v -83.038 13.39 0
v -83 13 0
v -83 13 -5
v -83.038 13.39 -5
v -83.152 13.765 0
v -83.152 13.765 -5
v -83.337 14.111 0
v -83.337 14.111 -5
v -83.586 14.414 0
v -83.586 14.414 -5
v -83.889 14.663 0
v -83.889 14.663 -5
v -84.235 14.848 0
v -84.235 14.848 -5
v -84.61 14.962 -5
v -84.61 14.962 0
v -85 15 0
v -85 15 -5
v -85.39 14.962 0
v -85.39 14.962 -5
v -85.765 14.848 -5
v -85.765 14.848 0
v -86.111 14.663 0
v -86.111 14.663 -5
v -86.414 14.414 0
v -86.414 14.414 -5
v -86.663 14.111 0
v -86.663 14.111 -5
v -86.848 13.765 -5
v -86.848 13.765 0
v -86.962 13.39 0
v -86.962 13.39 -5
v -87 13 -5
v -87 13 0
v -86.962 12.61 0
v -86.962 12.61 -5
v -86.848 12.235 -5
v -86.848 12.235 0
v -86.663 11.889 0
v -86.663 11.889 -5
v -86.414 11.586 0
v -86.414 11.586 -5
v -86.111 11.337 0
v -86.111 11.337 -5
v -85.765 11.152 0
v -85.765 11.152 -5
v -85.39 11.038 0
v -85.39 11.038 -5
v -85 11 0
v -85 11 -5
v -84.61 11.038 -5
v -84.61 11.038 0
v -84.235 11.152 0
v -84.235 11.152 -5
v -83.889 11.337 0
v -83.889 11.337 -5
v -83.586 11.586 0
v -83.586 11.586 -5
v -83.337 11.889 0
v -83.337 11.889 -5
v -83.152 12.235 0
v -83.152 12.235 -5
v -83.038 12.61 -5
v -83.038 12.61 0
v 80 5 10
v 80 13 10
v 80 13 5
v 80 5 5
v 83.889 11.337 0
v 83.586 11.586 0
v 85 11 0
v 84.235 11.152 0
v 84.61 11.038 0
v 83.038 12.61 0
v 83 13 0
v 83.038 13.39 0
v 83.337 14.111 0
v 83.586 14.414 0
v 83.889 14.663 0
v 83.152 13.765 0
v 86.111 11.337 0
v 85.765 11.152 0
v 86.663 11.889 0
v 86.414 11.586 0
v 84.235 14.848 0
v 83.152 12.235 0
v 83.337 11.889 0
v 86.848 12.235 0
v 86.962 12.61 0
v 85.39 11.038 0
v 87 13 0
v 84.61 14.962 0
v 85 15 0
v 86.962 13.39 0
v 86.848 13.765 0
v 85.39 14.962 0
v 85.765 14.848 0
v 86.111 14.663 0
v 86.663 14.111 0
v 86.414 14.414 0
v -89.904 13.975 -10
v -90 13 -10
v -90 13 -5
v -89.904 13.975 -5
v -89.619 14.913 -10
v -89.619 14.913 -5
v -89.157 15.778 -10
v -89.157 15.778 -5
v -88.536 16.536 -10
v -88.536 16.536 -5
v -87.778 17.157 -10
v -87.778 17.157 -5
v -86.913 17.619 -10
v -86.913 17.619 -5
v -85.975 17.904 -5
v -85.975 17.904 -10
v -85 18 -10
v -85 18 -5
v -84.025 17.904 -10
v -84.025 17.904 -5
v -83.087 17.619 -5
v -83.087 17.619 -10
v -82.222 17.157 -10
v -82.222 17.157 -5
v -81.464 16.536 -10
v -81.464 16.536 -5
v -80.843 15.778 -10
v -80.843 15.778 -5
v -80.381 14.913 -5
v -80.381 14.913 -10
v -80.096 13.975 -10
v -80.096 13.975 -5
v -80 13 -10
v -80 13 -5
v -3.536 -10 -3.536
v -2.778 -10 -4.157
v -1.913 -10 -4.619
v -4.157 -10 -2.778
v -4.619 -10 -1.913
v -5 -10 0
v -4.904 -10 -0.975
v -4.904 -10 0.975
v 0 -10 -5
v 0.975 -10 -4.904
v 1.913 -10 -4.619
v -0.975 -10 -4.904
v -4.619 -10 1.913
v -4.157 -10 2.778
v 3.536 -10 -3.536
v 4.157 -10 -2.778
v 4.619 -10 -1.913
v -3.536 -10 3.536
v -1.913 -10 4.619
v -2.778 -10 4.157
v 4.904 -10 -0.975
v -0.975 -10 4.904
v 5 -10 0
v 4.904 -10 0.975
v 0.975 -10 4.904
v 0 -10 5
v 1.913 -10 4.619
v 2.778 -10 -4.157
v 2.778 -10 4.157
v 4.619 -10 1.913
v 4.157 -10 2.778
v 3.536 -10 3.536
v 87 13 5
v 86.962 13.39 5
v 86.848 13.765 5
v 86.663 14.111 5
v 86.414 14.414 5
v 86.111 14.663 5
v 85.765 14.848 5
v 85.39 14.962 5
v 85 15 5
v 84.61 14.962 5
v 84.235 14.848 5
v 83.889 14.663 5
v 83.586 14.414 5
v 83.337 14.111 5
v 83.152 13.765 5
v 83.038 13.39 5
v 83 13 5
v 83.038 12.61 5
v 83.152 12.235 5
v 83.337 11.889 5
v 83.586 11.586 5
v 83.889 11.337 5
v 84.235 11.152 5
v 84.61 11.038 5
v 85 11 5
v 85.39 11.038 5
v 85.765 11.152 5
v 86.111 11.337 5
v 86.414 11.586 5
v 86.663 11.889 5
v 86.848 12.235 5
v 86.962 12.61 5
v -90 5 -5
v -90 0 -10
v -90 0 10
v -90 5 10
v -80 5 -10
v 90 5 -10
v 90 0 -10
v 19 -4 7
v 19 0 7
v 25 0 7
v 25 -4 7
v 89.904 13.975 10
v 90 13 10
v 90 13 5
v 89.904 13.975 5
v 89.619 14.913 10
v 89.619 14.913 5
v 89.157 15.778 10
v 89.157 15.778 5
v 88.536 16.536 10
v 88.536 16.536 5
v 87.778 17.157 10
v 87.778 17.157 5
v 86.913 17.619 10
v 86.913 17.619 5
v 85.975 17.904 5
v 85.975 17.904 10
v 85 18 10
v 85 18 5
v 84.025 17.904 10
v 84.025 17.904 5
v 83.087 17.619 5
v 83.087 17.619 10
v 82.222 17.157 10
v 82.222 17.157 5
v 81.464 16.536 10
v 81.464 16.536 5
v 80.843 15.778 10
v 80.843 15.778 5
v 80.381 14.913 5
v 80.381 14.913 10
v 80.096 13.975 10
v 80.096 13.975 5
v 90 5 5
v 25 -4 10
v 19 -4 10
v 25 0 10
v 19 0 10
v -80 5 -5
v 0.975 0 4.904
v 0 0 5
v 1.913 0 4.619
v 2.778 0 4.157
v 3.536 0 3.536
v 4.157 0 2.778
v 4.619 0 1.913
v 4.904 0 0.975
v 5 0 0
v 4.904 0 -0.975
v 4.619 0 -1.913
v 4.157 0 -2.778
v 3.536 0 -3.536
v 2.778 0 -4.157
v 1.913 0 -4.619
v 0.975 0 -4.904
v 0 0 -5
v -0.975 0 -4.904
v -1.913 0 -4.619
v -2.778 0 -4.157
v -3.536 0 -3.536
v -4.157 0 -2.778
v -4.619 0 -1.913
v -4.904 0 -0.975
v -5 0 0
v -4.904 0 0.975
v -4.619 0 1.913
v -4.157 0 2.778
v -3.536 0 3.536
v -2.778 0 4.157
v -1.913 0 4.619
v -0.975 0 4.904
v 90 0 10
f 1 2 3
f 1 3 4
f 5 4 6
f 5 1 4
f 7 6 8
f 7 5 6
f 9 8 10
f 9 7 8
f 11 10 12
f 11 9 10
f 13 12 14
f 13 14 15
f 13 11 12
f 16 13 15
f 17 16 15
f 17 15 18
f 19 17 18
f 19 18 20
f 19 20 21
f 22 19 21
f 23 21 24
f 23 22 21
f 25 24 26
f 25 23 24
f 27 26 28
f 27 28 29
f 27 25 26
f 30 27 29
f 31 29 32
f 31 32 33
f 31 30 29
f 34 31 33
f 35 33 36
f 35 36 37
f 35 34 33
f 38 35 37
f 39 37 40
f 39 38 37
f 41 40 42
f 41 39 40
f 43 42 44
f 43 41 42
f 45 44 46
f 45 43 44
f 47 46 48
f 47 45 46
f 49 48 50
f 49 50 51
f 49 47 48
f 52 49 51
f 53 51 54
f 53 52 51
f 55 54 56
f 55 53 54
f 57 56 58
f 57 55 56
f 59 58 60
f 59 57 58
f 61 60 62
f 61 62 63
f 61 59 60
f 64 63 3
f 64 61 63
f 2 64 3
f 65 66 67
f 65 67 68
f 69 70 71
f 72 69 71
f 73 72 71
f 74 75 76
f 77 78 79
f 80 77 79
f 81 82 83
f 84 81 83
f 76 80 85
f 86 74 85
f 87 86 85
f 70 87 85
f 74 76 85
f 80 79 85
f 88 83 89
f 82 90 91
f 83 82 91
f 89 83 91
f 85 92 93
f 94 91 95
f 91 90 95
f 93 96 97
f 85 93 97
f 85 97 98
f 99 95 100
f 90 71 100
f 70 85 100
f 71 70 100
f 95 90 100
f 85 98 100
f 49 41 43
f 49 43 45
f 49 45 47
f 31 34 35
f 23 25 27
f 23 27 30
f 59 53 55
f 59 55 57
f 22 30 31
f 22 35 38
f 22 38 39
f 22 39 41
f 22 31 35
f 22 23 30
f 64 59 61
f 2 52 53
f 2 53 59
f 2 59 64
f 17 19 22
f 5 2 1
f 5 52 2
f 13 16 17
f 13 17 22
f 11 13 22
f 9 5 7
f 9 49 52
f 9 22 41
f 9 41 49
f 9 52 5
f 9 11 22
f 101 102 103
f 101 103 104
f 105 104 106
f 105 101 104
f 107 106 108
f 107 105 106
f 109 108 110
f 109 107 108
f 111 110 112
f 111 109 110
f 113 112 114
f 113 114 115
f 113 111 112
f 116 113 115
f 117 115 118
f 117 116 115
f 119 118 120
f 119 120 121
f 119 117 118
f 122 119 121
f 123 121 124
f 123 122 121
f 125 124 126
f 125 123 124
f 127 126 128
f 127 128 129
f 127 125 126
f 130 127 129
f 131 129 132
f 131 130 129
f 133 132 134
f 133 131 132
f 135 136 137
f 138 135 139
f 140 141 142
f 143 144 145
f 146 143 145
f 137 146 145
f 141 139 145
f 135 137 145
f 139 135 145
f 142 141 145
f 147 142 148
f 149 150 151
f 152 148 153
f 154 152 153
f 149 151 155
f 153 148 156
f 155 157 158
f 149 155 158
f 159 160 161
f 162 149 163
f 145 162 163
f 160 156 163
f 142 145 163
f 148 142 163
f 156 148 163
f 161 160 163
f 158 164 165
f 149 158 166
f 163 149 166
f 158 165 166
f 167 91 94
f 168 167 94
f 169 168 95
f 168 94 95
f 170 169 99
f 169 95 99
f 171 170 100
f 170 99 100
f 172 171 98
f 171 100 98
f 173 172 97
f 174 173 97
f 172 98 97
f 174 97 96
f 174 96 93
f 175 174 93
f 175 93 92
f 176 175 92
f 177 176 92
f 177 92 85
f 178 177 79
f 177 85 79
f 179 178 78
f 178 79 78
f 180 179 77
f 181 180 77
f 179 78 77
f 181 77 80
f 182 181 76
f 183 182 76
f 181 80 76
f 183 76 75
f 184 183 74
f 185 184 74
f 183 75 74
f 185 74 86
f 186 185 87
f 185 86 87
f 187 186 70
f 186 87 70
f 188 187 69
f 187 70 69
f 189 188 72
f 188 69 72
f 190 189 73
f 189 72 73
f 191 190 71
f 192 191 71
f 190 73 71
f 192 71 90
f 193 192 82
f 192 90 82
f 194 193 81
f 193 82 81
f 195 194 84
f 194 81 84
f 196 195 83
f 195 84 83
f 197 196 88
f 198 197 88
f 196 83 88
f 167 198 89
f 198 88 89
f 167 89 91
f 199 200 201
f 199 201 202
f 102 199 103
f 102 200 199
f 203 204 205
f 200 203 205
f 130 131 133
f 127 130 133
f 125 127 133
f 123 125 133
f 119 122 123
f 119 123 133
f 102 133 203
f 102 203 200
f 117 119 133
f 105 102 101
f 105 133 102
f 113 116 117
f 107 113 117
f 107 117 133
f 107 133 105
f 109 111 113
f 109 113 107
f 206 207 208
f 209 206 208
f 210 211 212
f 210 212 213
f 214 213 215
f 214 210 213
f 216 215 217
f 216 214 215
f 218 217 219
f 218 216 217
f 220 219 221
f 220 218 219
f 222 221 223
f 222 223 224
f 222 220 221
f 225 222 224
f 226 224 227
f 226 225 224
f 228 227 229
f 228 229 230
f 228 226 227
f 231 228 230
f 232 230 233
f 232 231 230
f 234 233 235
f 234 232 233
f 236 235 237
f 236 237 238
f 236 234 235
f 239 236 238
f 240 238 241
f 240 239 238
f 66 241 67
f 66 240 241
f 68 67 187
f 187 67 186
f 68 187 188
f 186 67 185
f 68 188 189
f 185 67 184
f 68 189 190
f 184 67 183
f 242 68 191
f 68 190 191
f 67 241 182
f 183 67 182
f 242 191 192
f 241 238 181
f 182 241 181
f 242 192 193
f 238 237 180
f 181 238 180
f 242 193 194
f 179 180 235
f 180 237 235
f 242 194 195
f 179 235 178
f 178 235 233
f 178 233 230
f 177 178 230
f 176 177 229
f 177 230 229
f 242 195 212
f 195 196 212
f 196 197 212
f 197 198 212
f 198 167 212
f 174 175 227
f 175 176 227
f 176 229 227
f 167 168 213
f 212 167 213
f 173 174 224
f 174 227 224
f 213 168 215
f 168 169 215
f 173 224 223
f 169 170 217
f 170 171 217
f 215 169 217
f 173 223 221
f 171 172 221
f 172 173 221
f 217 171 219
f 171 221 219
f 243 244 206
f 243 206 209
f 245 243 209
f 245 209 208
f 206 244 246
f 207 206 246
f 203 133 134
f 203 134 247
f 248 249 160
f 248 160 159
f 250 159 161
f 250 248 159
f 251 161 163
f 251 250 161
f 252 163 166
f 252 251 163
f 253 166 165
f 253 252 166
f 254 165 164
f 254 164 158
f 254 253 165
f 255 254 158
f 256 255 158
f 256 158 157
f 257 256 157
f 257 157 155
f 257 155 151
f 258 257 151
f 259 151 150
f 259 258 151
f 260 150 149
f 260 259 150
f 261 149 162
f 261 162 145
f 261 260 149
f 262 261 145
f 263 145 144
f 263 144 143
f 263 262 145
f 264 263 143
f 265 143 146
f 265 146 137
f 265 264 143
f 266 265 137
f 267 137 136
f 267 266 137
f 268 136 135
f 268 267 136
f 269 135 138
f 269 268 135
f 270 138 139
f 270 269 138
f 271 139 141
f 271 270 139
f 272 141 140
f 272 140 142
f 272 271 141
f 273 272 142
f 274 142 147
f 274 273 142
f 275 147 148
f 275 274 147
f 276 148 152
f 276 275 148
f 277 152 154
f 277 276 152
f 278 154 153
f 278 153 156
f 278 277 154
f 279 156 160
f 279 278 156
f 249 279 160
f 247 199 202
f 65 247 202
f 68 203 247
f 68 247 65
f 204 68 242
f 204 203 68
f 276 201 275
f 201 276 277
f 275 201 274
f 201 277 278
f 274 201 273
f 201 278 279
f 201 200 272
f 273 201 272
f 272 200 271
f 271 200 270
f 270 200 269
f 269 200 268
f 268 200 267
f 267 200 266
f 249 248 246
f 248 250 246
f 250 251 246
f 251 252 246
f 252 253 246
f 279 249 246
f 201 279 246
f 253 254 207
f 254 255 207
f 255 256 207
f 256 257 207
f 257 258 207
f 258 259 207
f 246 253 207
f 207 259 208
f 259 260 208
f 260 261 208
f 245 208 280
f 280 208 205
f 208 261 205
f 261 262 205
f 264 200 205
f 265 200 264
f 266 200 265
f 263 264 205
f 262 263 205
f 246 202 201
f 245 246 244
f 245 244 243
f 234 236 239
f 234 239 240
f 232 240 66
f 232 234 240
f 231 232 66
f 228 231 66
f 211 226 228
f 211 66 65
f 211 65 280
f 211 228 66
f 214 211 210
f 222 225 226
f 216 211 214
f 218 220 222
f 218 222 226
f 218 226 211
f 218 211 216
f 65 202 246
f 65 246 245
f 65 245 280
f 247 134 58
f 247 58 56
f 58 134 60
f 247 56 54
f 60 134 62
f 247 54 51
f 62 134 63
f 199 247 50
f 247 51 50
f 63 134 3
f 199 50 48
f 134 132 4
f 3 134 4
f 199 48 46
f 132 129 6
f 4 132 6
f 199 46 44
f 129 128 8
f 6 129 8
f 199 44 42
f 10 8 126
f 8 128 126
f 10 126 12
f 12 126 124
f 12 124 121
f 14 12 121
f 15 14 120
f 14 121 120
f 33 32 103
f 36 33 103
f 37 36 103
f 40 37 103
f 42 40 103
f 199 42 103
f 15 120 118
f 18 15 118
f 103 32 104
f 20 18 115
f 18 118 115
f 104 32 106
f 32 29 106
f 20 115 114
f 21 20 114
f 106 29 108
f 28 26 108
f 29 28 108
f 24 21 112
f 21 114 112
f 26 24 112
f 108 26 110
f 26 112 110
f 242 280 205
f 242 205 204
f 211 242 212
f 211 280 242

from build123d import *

# Parameters (mm, degrees)
SKETCH1_W           = 180
SKETCH1_H           = 20
SKETCH1_R           = 5
BOSS_EXTRUDE1_DEPTH = 5
BOSS_EXTRUDE4_START = -10
SKETCH2_R           = 2
BOSS_EXTRUDE4_DEPTH = 5
SKETCH2_3_R         = 2
BOSS_EXTRUDE5_DEPTH = 5
BOSS_EXTRUDE6_START = 10
SKETCH2_4_R         = 2
BOSS_EXTRUDE6_DEPTH = 5
SKETCH2_5_R         = 2
BOSS_EXTRUDE7_DEPTH = 5
SKETCH1_3_R         = 5
BOSS_EXTRUDE8_DEPTH = 10
SKETCH3_W           = 6
SKETCH3_H           = 4
BOSS_EXTRUDE9_DEPTH = 3


with BuildPart() as part:
    # Sketch1 → Boss-Extrude1 (new body)
    # profile 1 of 2: a face of its own
    with BuildSketch(Plane(origin=(0, 0, 0), x_dir=(1, 0, 0), z_dir=(0, 1, 0))):
        Rectangle(SKETCH1_W, SKETCH1_H)
        Circle(SKETCH1_R, mode=Mode.SUBTRACT)
    # profile 2 of 2: a face of its own
    with BuildSketch(Plane(origin=(0, 0, 0), x_dir=(1, 0, 0), z_dir=(0, 1, 0))):
        Circle(SKETCH1_R)
    extrude(amount=BOSS_EXTRUDE1_DEPTH)

    # Sketch2 → Boss-Extrude4 (add)
    # profile 1 of 2: a face of its own
    with BuildSketch(Plane.XY.offset(BOSS_EXTRUDE4_START)):
        with BuildLine():
            ThreePointArc((-90, 13), (-85, 18), (-80, 13))
            Line((-80, 13), (-80, 5))
            Line((-80, 5), (-90, 5))
            Line((-90, 5), (-90, 13))
        make_face()
        with Locations((-85, 13)):
            Circle(SKETCH2_R, mode=Mode.SUBTRACT)
    # profile 2 of 2: a face of its own
    with BuildSketch(Plane.XY.offset(BOSS_EXTRUDE4_START)):
        with Locations((-85, 13)):
            Circle(SKETCH2_R)
    extrude(amount=BOSS_EXTRUDE4_DEPTH)

    # Sketch2<3> → Boss-Extrude5 (add)
    with BuildSketch(Plane.XY):
        with Locations((-85, 13)):
            Circle(SKETCH2_3_R)
    extrude(amount=-BOSS_EXTRUDE5_DEPTH)

    # Sketch2<4> → Boss-Extrude6 (add)
    # profile 1 of 2: a face of its own
    with BuildSketch(Plane.XY.offset(BOSS_EXTRUDE6_START)):
        with BuildLine():
            Line((90, 5), (90, 13))
            ThreePointArc((90, 13), (85, 18), (80, 13))
            Line((80, 13), (80, 5))
            Line((80, 5), (90, 5))
        make_face()
        with Locations((85, 13)):
            Circle(SKETCH2_4_R, mode=Mode.SUBTRACT)
    # profile 2 of 2: a face of its own
    with BuildSketch(Plane.XY.offset(BOSS_EXTRUDE6_START)):
        with Locations((85, 13)):
            Circle(SKETCH2_4_R)
    extrude(amount=-BOSS_EXTRUDE6_DEPTH)

    # Sketch2<5> → Boss-Extrude7 (add)
    with BuildSketch(Plane.XY):
        with Locations((85, 13)):
            Circle(SKETCH2_5_R)
    extrude(amount=BOSS_EXTRUDE7_DEPTH)

    # Sketch1<3> → Boss-Extrude8 (add)
    with BuildSketch(Plane(origin=(0, 0, 0), x_dir=(1, 0, 0), z_dir=(0, 1, 0))):
        with Locations(Location((0, 0, 0), (0, 0, 270))):
            Circle(SKETCH1_3_R)
    extrude(amount=-BOSS_EXTRUDE8_DEPTH)

    # Sketch3 → Boss-Extrude9 (add)
    with BuildSketch(Plane.XY.offset(10)):
        with Locations((22, -2)):
            Rectangle(SKETCH3_W, SKETCH3_H)
    extrude(amount=-BOSS_EXTRUDE9_DEPTH)


solid = part.part
